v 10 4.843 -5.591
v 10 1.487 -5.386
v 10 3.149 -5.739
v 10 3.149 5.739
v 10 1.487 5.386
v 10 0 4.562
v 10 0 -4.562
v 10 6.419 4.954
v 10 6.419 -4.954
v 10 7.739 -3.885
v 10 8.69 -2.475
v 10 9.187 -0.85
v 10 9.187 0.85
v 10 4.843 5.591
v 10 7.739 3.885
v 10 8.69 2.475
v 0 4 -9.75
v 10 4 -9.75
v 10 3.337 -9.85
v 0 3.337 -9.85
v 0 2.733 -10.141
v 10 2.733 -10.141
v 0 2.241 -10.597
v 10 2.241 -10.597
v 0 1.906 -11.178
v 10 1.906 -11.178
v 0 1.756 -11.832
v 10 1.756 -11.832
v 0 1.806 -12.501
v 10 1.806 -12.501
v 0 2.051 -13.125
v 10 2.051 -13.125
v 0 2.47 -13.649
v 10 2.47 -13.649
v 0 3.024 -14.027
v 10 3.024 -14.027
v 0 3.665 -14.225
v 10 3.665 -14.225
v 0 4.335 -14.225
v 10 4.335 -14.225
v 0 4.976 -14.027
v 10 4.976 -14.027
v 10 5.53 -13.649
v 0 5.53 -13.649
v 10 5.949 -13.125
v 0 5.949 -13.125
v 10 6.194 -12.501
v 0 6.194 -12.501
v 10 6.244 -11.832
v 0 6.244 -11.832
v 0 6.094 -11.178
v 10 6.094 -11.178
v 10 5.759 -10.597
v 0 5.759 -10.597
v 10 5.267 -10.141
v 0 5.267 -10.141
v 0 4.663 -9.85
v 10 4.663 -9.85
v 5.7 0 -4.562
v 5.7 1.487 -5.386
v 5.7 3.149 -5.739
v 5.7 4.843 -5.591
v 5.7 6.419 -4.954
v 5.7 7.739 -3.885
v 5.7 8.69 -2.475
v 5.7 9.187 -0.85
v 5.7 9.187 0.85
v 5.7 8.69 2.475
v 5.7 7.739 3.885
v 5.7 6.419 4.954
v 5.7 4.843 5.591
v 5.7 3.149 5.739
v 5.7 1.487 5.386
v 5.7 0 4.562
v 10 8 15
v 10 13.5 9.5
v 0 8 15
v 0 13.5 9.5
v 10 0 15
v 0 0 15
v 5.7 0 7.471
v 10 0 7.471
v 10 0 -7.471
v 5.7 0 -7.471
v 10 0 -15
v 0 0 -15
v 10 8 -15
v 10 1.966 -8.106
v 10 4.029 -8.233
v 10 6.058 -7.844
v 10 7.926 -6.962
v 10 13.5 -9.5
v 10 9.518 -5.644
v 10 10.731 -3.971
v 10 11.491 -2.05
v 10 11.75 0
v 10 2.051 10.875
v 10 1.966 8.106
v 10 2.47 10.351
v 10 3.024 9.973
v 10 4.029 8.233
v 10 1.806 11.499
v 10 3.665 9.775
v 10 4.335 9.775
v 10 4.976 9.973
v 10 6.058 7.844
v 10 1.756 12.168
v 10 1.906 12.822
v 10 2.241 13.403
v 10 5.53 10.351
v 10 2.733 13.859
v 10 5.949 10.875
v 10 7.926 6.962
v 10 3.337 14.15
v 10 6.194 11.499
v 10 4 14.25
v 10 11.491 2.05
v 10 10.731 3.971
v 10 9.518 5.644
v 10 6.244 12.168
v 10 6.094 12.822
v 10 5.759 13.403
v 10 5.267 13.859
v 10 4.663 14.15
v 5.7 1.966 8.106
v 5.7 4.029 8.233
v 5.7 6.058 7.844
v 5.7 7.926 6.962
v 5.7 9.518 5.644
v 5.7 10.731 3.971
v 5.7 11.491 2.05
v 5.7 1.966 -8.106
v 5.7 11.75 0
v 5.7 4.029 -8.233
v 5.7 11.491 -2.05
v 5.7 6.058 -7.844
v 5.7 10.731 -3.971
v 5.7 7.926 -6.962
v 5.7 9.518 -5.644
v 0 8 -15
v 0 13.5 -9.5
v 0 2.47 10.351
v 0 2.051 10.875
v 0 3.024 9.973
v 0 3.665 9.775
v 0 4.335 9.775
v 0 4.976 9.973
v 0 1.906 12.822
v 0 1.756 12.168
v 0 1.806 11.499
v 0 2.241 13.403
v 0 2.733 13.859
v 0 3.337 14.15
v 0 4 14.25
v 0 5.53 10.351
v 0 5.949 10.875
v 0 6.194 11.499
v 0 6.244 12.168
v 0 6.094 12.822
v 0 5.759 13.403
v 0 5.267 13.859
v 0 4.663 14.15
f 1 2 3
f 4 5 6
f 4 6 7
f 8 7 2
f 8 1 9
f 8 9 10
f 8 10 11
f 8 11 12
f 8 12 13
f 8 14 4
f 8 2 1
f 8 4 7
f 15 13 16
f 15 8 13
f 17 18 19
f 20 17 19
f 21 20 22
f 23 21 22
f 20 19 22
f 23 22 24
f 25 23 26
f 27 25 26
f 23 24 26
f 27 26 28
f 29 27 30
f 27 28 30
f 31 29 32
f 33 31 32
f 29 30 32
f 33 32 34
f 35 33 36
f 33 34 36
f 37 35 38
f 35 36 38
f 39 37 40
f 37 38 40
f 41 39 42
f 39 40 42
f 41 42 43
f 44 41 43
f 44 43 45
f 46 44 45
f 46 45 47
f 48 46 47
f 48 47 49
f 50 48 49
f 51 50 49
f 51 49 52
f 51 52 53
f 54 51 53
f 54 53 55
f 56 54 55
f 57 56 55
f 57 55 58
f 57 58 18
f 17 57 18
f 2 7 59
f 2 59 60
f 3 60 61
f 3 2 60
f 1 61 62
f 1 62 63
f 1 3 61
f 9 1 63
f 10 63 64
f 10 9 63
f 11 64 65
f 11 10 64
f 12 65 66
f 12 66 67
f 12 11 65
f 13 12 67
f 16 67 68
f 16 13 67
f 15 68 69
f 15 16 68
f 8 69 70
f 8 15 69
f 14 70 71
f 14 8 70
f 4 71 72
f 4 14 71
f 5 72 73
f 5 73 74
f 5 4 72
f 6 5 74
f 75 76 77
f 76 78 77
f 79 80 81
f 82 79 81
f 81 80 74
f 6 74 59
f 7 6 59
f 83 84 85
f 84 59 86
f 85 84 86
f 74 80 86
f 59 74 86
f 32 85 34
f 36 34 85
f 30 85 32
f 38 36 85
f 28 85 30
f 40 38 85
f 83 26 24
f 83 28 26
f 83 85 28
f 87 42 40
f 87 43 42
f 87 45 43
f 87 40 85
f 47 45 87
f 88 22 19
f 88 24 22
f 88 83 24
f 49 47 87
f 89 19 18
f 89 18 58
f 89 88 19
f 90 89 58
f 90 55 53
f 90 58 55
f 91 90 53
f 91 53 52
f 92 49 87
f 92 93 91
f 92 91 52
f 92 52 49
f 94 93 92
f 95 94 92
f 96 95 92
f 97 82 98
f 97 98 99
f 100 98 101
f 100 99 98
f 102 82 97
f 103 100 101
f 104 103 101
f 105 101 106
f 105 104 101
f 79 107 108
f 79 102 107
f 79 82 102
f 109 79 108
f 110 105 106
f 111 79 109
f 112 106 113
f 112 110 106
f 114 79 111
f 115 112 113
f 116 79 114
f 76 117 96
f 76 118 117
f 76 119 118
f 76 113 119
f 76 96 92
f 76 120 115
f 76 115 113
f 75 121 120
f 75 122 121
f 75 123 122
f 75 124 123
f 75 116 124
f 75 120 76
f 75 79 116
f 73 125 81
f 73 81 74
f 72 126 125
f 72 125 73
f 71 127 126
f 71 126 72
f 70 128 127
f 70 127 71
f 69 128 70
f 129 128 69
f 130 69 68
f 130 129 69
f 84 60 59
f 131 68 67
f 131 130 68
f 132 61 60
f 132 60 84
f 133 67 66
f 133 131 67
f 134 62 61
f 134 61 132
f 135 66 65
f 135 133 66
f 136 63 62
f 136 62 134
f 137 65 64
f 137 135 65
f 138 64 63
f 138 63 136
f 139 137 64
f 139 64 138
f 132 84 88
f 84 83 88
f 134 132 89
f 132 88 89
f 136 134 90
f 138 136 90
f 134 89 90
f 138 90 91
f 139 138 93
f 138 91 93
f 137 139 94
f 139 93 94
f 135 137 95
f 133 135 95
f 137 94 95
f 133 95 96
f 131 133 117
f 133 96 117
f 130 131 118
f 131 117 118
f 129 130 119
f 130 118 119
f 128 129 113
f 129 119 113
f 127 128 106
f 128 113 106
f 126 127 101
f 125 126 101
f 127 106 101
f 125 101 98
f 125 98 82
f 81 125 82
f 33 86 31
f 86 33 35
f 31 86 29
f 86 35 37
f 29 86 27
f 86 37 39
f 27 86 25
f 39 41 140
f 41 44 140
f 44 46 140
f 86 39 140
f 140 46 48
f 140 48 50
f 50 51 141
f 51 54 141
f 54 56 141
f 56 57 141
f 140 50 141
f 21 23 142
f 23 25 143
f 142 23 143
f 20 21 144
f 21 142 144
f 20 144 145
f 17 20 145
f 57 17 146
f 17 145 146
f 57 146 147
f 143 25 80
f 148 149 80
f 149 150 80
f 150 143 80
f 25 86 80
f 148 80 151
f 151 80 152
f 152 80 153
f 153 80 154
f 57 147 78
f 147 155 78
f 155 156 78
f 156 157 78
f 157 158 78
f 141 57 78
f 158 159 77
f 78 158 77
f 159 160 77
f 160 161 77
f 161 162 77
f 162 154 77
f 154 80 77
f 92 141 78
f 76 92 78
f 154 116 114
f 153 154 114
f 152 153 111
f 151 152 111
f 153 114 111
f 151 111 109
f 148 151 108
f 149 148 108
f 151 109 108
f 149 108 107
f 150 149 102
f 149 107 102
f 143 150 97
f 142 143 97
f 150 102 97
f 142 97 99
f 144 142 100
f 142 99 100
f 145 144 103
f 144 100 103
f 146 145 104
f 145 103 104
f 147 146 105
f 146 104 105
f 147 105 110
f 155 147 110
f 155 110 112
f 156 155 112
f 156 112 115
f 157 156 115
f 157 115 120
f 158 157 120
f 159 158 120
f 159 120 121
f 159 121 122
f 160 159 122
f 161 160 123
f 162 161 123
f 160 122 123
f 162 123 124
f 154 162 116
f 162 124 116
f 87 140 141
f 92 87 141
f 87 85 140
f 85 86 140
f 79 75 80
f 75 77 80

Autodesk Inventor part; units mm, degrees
ref_plane "YZ Plane" through (0, 0, 0) normal (1, 0, 0) x (0, 1, 0)
ref_plane "XZ Plane" through (0, 0, 0) normal (0, 1, 0) x (-1, 0, 0)
ref_plane "XY Plane" through (0, 0, 0) normal (0, 0, 1) x (1, 0, 0)
sketch "Sketch1" plane through (0, 0, 0) normal (1, 0, 0) x (0, 1, 0)
  line L0 (13.5, 9.5) -> (8, 15)
  line L1 (8, 15) -> (0, 15)
  line L2 (0, 15) -> (0, -15)
  line L3 (8, -15) -> (13.5, -9.5)
  line L4 (13.5, -9.5) -> (13.5, 9.5)
  line L5 (0, -15) -> (8, -15)
  point P0 (0, 0)
  dimension "d21" = 30
  dimension "d22" = 8
  dimension "d23" = 13.5
extrude "Extrusion2" add sketch "Sketch1" along normal blind 10
sketch "Sketch2" plane through (10, 0, 0) normal (1, 0, 0) x (0, 0, -1)
  line L0 (4.5621, 0) -> (7.4708, 0)
  arc A0 (4.5621, 0) -> (-4.5621, 0) centre (0, 3.5) ccw
  arc A1 (7.4708, 0) -> (-7.4708, 0) centre (0, 3.5) ccw
  line L1 (-7.4708, 0) -> (-4.5621, 0)
  line L2 (-15, 0) -> (15, 0) projected
  point P0 (0, 0)
  dimension "d18" = 5.75
  dimension "d19" = 3.5
  dimension "d20" = 8.25
extrude "Extrusion1" cut sketch "Sketch2" against normal blind 4.3 contours A0 L1 A1 L0
hole "Hole2" at (0, 4, -12) direction (1, 0, 0) diameter 4.5 depth 10
sketch "Sketch3" plane through (0, 0, 0) normal (1, 0, 0) x (0, 1, 0)
  point P0 (4, -12)
hole "Hole1" at (0, 4, 12) direction (1, 0, 0) diameter 4.5 depth 10
sketch "Sketch4" plane through (0, 0, 0) normal (1, 0, 0) x (0, 1, 0)
  point P0 (4, 12)
properties part number "Spreader Holder" material "ASA Plastic"
